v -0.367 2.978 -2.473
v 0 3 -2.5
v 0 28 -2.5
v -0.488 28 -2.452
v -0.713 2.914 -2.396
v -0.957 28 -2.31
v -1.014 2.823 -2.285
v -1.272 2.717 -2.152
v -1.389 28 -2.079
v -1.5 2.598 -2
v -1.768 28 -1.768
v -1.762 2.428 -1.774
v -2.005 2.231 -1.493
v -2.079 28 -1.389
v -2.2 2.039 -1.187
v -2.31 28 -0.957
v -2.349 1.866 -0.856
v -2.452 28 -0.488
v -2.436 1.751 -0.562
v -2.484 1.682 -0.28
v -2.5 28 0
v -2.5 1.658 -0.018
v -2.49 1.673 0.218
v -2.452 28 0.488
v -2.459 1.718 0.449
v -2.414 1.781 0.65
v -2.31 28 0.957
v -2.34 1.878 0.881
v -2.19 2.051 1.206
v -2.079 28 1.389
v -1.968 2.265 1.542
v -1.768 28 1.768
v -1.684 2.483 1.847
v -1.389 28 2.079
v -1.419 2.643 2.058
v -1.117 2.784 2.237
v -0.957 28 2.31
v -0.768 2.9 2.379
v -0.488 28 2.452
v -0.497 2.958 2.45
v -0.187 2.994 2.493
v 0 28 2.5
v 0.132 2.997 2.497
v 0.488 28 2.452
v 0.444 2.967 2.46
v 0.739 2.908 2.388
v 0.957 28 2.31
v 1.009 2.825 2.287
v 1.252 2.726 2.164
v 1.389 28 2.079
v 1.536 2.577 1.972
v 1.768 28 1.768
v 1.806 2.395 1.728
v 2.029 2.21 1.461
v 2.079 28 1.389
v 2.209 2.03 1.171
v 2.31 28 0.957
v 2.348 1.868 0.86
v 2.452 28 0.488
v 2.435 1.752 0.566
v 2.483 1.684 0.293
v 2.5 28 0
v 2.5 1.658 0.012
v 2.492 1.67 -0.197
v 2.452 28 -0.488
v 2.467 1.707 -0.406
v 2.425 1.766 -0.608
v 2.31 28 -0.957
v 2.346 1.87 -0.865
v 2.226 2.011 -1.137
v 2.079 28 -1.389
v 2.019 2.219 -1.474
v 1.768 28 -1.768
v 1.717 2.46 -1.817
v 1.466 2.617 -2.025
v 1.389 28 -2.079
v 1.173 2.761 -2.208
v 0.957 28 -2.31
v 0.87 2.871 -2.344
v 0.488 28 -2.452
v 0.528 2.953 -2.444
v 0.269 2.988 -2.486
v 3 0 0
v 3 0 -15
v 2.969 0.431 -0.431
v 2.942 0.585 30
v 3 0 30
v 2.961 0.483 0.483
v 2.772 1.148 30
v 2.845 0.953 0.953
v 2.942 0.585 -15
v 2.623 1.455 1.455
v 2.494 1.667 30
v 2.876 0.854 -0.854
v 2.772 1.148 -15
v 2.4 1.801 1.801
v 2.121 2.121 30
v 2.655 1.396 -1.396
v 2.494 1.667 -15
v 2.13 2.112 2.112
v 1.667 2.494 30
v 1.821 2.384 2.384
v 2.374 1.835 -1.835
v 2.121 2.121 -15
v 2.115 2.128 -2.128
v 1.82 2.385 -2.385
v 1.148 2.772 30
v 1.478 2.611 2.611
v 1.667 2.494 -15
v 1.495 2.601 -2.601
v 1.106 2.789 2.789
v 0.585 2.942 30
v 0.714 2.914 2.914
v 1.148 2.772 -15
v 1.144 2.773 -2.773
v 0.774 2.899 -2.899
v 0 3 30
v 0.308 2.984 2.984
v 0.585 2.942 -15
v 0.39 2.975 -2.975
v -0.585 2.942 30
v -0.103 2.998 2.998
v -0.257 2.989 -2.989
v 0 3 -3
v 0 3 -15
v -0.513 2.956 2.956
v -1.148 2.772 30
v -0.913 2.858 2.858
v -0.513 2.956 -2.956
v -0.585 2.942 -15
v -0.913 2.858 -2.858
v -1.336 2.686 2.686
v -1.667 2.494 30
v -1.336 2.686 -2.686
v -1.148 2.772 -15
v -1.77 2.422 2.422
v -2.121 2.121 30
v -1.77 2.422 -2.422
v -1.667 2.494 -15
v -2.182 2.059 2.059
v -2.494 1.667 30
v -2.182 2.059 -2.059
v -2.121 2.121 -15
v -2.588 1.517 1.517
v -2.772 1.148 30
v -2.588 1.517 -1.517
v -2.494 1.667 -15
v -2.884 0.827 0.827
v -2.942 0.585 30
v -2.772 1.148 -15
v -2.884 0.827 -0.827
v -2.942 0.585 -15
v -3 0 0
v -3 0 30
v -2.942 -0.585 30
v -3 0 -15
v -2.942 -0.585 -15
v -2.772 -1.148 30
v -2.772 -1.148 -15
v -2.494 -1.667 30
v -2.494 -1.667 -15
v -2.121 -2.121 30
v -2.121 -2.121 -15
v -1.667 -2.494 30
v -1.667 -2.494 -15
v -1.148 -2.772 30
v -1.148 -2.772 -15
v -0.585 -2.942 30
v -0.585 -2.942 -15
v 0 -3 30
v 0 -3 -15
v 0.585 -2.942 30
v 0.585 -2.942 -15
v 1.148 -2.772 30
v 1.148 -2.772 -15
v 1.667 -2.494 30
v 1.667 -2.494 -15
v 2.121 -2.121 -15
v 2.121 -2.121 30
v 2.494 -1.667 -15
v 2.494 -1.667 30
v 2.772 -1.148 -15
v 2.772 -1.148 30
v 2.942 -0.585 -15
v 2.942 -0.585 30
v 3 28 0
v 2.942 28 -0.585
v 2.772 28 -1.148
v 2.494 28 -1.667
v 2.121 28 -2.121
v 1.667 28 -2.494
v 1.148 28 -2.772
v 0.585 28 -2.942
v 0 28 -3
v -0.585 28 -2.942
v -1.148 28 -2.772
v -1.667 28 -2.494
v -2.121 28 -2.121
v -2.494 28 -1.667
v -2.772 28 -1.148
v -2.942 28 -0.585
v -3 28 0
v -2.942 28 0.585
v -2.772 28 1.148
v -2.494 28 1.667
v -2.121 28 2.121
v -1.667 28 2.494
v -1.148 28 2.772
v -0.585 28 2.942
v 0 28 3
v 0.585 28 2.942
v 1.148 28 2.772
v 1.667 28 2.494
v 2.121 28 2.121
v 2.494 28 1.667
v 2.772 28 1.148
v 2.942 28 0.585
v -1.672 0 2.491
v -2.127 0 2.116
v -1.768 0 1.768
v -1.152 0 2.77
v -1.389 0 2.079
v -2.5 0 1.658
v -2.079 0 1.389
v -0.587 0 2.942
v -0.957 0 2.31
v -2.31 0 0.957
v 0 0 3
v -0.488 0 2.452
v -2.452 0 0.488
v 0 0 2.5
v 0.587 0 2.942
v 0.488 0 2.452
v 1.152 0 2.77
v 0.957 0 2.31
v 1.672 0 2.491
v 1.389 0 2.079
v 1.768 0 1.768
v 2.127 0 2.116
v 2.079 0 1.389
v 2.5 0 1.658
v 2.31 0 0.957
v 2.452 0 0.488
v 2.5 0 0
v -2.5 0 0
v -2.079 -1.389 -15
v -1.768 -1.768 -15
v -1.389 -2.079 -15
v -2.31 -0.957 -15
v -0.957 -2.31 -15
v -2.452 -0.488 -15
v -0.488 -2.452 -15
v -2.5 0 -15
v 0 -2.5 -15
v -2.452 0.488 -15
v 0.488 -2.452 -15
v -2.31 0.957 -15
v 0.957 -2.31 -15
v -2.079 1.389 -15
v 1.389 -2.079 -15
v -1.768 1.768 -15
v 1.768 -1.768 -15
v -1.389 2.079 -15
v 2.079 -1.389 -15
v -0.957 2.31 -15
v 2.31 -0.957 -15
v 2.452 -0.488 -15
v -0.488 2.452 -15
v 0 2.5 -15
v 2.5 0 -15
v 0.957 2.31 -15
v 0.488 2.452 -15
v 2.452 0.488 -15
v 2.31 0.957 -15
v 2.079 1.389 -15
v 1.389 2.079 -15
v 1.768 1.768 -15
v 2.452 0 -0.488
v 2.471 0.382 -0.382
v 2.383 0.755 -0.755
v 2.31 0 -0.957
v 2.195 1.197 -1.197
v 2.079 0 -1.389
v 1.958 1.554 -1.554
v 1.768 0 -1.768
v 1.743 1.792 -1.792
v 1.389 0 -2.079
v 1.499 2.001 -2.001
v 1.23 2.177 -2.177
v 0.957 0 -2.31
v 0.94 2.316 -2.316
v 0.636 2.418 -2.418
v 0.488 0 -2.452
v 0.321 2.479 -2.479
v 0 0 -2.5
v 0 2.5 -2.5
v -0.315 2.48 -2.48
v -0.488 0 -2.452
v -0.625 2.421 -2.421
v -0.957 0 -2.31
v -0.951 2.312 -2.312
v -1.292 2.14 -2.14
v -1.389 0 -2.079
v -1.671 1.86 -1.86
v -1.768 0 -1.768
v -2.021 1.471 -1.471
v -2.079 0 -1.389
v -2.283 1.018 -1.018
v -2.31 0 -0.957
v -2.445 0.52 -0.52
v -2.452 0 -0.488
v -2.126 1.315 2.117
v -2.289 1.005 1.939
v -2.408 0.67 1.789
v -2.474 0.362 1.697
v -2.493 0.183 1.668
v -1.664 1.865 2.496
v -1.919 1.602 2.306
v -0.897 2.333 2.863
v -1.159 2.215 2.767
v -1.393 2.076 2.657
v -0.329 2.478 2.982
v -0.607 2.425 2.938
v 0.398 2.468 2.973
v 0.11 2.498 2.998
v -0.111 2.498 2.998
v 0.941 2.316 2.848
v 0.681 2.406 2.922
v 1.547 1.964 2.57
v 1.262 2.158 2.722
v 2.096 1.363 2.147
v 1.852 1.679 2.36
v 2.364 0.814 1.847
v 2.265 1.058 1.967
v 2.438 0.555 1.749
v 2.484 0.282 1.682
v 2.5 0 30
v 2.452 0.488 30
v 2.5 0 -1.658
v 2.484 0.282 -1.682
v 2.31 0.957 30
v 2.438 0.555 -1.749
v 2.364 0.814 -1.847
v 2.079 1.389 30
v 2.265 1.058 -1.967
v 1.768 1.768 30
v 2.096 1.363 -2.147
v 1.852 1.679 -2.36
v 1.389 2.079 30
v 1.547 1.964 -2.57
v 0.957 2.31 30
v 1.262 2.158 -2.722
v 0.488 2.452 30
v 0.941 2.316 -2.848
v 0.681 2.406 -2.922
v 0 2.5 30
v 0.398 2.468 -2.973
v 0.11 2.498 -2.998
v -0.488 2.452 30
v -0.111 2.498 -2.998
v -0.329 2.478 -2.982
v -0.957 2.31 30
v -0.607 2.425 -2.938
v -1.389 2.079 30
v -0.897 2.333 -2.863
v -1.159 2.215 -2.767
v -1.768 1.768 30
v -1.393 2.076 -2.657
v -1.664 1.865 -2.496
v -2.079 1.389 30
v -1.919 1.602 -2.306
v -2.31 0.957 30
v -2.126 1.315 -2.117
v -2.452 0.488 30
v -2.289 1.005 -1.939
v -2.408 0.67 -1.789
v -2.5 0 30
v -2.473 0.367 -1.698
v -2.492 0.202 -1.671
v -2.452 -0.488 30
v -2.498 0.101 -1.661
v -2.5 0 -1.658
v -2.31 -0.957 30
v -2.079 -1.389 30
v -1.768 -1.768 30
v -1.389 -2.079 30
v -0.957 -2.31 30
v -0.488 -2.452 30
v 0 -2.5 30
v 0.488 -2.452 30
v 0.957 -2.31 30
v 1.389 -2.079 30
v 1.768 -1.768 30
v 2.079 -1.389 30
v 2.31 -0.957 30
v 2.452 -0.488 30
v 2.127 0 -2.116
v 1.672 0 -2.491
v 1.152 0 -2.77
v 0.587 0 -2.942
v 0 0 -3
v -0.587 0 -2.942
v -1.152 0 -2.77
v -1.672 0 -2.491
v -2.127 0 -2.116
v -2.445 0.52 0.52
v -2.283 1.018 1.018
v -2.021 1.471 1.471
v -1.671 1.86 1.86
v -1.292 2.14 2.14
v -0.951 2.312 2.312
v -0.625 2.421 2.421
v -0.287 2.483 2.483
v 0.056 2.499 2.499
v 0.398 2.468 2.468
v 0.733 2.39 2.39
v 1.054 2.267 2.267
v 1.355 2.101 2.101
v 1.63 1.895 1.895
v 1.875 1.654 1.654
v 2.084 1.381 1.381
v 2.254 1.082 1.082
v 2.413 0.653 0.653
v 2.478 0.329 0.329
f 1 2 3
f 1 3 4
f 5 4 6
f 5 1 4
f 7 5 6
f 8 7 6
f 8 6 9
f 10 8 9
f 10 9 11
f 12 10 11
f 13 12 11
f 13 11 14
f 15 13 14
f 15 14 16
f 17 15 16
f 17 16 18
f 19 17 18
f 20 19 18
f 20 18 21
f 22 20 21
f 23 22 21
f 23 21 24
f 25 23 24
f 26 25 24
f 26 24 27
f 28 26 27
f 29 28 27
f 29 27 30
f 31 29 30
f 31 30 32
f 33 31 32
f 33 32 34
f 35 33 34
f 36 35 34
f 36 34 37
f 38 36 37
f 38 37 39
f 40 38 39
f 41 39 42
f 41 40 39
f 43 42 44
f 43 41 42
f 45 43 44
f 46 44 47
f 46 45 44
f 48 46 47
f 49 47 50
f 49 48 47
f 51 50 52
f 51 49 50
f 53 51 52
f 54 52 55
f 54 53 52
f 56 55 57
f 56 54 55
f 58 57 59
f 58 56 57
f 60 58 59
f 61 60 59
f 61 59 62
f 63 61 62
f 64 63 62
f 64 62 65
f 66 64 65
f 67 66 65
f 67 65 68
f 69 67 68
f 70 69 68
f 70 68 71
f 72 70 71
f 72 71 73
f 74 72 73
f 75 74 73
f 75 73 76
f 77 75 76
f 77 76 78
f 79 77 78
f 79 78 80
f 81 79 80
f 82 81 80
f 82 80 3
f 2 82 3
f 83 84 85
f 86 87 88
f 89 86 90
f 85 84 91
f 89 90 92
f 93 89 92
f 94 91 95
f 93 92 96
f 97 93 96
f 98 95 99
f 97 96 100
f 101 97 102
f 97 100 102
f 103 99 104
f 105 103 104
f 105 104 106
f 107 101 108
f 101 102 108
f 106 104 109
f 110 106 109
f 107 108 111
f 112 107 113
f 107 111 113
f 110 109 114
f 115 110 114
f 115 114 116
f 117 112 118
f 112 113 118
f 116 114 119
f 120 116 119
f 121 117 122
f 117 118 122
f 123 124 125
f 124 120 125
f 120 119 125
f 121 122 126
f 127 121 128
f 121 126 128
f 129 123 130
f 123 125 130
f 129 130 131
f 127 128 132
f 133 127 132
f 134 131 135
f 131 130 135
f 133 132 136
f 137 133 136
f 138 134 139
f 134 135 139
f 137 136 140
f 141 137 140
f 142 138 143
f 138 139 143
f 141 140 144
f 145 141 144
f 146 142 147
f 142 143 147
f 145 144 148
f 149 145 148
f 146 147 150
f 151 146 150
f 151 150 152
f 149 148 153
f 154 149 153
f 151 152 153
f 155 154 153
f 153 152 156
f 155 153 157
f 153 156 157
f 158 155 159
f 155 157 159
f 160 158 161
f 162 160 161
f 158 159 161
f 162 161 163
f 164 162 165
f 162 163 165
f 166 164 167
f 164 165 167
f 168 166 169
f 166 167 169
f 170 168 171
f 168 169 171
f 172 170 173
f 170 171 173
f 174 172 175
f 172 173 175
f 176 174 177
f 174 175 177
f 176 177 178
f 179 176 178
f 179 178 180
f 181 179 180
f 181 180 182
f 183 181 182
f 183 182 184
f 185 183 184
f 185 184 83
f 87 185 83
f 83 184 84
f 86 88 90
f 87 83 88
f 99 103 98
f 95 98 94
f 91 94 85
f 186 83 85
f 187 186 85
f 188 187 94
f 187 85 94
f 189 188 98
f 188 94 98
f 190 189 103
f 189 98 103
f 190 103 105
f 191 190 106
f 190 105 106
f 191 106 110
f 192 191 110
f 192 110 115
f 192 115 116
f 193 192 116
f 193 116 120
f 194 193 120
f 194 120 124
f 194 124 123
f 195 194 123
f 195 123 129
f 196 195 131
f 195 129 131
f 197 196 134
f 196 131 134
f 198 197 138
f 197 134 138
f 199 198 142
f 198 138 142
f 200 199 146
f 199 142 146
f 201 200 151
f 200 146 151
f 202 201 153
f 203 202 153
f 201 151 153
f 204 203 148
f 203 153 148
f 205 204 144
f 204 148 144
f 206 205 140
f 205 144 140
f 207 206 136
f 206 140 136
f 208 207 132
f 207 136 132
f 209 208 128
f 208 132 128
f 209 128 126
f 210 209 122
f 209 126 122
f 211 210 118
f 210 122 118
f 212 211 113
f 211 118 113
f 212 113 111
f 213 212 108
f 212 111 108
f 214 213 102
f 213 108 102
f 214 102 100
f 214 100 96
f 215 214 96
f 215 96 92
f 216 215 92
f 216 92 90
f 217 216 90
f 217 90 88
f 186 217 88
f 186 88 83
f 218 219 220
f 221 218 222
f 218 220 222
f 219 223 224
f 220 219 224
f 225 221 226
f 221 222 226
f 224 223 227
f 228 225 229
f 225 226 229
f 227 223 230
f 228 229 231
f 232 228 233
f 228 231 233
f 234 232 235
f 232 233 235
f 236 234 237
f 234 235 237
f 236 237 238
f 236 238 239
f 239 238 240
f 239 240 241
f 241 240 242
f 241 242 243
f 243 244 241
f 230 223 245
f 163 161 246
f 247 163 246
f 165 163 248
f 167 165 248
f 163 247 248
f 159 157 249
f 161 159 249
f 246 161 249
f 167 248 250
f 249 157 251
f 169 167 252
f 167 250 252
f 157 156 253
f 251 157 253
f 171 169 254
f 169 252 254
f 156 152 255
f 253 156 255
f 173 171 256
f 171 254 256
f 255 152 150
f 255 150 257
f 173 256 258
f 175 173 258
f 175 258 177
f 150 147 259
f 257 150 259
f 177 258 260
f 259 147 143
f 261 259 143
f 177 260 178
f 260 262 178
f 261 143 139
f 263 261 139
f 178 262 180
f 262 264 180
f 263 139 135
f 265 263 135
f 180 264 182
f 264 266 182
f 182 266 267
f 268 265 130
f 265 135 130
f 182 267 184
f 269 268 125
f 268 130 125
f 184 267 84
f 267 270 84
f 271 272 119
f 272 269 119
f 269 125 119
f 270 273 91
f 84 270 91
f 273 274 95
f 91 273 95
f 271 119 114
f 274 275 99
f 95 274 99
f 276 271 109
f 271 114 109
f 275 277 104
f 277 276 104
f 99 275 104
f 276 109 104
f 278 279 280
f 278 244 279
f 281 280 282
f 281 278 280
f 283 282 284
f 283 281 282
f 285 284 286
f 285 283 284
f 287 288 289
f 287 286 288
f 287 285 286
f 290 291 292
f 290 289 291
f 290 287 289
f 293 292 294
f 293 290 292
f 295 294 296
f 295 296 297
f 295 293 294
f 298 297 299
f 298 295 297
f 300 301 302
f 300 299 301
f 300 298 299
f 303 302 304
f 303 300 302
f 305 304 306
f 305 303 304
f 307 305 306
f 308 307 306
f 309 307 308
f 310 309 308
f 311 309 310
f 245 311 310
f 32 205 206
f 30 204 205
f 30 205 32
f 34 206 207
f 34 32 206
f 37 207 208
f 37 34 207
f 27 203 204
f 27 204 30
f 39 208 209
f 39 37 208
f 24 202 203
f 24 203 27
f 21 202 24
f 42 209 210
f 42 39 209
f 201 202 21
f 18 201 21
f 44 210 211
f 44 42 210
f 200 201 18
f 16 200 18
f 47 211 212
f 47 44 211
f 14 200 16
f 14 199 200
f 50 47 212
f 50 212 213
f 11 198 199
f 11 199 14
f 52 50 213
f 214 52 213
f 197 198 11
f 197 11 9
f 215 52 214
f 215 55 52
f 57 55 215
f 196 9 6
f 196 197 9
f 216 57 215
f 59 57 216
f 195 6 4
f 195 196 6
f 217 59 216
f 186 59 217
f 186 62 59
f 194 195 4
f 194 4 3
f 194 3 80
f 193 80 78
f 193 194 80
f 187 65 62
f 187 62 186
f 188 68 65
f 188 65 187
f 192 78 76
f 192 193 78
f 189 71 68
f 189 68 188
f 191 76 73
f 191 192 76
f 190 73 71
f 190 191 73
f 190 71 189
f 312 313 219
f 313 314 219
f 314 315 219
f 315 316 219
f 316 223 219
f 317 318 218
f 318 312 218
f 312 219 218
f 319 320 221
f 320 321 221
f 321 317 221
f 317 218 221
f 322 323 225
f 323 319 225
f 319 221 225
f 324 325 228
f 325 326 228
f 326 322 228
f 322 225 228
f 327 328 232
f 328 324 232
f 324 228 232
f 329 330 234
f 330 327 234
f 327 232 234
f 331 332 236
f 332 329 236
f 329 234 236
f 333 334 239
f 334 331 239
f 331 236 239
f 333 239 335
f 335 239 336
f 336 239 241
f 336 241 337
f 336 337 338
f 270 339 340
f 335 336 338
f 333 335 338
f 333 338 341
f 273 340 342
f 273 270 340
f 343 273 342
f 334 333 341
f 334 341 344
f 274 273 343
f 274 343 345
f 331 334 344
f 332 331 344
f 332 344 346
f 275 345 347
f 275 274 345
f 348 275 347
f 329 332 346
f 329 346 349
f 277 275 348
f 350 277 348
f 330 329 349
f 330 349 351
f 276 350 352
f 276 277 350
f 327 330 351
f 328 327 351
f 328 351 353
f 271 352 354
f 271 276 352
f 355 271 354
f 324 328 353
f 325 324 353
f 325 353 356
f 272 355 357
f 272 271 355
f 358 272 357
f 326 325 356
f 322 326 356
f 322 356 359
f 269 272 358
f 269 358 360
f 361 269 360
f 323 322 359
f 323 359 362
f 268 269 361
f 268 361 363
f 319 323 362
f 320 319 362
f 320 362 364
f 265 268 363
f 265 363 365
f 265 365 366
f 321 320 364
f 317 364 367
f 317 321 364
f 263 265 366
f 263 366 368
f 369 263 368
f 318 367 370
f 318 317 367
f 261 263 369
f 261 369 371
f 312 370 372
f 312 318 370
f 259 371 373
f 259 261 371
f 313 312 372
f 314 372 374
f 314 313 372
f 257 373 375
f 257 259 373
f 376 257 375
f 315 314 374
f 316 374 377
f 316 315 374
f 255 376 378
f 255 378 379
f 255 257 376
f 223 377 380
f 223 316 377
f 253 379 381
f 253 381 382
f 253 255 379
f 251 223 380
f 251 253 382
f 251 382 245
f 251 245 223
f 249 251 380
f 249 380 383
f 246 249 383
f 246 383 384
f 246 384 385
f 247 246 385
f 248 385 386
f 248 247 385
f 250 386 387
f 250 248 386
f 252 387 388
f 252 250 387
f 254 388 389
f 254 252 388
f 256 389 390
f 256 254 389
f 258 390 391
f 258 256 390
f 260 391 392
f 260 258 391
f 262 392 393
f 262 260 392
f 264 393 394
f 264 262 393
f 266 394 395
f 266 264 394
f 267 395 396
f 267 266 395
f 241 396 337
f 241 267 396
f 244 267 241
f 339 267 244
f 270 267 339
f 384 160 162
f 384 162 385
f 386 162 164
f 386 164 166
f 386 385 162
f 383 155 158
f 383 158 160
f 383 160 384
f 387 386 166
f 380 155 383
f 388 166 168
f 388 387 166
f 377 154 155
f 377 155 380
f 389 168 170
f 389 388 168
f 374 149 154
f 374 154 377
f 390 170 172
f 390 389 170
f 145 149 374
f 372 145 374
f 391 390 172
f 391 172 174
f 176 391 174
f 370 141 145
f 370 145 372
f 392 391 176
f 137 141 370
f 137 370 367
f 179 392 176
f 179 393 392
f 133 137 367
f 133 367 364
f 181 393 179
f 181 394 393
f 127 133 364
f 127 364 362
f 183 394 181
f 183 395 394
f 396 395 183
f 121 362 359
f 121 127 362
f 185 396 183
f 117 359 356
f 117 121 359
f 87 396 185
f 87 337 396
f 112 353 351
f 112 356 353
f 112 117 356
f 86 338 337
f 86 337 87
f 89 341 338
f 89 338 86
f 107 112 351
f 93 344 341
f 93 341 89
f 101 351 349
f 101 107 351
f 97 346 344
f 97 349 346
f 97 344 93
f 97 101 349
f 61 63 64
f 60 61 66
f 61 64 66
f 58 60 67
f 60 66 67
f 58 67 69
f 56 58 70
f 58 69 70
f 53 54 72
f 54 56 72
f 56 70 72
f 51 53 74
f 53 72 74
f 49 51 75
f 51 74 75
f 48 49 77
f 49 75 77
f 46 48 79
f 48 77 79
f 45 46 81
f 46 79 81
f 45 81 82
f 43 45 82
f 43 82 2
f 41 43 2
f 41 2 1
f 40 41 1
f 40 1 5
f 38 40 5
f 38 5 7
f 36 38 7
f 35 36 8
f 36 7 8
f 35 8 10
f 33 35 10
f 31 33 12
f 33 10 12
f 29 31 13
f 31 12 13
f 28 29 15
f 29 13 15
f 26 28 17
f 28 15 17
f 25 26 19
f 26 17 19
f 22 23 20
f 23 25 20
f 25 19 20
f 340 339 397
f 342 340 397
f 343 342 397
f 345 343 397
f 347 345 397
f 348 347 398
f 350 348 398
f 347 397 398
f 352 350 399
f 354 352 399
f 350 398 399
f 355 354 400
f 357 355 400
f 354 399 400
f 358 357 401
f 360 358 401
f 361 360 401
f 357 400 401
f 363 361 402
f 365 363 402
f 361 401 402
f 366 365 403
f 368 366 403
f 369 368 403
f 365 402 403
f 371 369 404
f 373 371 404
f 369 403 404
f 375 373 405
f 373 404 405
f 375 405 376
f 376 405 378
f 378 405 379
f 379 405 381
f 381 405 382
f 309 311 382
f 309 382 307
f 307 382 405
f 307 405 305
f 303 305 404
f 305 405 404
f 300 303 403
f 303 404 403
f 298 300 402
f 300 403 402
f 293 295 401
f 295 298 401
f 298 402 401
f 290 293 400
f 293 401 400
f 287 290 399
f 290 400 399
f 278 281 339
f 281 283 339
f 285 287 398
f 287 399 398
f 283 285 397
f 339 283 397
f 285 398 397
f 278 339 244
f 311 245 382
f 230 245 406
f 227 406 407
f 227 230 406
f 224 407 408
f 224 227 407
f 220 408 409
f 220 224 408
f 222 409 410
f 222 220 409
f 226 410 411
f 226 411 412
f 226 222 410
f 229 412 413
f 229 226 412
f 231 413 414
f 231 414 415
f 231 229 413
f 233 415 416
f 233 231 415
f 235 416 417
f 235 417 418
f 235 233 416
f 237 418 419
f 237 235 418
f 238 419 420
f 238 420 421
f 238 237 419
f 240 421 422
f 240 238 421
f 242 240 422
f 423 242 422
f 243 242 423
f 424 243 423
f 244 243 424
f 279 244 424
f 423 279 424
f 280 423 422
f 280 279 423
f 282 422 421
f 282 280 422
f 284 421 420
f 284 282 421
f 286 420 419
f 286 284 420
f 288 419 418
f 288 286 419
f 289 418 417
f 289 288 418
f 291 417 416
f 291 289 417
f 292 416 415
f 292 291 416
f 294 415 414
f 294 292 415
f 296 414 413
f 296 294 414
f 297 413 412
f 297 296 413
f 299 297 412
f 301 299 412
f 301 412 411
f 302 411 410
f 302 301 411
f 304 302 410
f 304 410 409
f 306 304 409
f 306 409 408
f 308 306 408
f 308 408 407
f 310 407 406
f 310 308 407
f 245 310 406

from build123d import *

# Parameters (mm, degrees)
BOSS_EXTRU_1_DEPTH      = 30
BOSS_EXTRU_1_DEPTH_BACK = 15
ESQUISSE1_R             = 3
ESQUISSE1_R_2           = 2.5
ESQUISSE2_R             = 3
ESQUISSE2_R_2           = 2.5
BOSS_EXTRU_2_DEPTH      = 28


with BuildPart() as part:
    # Esquisse1 → Boss.-Extru.1 (new, two sides: drawn at the far end of the back side and taken through both)
    with BuildSketch(Plane.XY.offset(-BOSS_EXTRU_1_DEPTH_BACK)):
        Circle(ESQUISSE1_R)
        Circle(ESQUISSE1_R_2, mode=Mode.SUBTRACT)
    extrude(amount=BOSS_EXTRU_1_DEPTH + BOSS_EXTRU_1_DEPTH_BACK)

    # Esquisse2 → Boss.-Extru.2 (add)
    with BuildSketch(Plane(origin=(0, 0, 0), x_dir=(1, 0, 0), z_dir=(0, 1, 0))):
        Circle(ESQUISSE2_R)
        with Locations(Location((0, 0, 0), (0, 0, 90))):
            Circle(ESQUISSE2_R_2, mode=Mode.SUBTRACT)
    extrude(amount=BOSS_EXTRU_2_DEPTH)


solid = part.part
